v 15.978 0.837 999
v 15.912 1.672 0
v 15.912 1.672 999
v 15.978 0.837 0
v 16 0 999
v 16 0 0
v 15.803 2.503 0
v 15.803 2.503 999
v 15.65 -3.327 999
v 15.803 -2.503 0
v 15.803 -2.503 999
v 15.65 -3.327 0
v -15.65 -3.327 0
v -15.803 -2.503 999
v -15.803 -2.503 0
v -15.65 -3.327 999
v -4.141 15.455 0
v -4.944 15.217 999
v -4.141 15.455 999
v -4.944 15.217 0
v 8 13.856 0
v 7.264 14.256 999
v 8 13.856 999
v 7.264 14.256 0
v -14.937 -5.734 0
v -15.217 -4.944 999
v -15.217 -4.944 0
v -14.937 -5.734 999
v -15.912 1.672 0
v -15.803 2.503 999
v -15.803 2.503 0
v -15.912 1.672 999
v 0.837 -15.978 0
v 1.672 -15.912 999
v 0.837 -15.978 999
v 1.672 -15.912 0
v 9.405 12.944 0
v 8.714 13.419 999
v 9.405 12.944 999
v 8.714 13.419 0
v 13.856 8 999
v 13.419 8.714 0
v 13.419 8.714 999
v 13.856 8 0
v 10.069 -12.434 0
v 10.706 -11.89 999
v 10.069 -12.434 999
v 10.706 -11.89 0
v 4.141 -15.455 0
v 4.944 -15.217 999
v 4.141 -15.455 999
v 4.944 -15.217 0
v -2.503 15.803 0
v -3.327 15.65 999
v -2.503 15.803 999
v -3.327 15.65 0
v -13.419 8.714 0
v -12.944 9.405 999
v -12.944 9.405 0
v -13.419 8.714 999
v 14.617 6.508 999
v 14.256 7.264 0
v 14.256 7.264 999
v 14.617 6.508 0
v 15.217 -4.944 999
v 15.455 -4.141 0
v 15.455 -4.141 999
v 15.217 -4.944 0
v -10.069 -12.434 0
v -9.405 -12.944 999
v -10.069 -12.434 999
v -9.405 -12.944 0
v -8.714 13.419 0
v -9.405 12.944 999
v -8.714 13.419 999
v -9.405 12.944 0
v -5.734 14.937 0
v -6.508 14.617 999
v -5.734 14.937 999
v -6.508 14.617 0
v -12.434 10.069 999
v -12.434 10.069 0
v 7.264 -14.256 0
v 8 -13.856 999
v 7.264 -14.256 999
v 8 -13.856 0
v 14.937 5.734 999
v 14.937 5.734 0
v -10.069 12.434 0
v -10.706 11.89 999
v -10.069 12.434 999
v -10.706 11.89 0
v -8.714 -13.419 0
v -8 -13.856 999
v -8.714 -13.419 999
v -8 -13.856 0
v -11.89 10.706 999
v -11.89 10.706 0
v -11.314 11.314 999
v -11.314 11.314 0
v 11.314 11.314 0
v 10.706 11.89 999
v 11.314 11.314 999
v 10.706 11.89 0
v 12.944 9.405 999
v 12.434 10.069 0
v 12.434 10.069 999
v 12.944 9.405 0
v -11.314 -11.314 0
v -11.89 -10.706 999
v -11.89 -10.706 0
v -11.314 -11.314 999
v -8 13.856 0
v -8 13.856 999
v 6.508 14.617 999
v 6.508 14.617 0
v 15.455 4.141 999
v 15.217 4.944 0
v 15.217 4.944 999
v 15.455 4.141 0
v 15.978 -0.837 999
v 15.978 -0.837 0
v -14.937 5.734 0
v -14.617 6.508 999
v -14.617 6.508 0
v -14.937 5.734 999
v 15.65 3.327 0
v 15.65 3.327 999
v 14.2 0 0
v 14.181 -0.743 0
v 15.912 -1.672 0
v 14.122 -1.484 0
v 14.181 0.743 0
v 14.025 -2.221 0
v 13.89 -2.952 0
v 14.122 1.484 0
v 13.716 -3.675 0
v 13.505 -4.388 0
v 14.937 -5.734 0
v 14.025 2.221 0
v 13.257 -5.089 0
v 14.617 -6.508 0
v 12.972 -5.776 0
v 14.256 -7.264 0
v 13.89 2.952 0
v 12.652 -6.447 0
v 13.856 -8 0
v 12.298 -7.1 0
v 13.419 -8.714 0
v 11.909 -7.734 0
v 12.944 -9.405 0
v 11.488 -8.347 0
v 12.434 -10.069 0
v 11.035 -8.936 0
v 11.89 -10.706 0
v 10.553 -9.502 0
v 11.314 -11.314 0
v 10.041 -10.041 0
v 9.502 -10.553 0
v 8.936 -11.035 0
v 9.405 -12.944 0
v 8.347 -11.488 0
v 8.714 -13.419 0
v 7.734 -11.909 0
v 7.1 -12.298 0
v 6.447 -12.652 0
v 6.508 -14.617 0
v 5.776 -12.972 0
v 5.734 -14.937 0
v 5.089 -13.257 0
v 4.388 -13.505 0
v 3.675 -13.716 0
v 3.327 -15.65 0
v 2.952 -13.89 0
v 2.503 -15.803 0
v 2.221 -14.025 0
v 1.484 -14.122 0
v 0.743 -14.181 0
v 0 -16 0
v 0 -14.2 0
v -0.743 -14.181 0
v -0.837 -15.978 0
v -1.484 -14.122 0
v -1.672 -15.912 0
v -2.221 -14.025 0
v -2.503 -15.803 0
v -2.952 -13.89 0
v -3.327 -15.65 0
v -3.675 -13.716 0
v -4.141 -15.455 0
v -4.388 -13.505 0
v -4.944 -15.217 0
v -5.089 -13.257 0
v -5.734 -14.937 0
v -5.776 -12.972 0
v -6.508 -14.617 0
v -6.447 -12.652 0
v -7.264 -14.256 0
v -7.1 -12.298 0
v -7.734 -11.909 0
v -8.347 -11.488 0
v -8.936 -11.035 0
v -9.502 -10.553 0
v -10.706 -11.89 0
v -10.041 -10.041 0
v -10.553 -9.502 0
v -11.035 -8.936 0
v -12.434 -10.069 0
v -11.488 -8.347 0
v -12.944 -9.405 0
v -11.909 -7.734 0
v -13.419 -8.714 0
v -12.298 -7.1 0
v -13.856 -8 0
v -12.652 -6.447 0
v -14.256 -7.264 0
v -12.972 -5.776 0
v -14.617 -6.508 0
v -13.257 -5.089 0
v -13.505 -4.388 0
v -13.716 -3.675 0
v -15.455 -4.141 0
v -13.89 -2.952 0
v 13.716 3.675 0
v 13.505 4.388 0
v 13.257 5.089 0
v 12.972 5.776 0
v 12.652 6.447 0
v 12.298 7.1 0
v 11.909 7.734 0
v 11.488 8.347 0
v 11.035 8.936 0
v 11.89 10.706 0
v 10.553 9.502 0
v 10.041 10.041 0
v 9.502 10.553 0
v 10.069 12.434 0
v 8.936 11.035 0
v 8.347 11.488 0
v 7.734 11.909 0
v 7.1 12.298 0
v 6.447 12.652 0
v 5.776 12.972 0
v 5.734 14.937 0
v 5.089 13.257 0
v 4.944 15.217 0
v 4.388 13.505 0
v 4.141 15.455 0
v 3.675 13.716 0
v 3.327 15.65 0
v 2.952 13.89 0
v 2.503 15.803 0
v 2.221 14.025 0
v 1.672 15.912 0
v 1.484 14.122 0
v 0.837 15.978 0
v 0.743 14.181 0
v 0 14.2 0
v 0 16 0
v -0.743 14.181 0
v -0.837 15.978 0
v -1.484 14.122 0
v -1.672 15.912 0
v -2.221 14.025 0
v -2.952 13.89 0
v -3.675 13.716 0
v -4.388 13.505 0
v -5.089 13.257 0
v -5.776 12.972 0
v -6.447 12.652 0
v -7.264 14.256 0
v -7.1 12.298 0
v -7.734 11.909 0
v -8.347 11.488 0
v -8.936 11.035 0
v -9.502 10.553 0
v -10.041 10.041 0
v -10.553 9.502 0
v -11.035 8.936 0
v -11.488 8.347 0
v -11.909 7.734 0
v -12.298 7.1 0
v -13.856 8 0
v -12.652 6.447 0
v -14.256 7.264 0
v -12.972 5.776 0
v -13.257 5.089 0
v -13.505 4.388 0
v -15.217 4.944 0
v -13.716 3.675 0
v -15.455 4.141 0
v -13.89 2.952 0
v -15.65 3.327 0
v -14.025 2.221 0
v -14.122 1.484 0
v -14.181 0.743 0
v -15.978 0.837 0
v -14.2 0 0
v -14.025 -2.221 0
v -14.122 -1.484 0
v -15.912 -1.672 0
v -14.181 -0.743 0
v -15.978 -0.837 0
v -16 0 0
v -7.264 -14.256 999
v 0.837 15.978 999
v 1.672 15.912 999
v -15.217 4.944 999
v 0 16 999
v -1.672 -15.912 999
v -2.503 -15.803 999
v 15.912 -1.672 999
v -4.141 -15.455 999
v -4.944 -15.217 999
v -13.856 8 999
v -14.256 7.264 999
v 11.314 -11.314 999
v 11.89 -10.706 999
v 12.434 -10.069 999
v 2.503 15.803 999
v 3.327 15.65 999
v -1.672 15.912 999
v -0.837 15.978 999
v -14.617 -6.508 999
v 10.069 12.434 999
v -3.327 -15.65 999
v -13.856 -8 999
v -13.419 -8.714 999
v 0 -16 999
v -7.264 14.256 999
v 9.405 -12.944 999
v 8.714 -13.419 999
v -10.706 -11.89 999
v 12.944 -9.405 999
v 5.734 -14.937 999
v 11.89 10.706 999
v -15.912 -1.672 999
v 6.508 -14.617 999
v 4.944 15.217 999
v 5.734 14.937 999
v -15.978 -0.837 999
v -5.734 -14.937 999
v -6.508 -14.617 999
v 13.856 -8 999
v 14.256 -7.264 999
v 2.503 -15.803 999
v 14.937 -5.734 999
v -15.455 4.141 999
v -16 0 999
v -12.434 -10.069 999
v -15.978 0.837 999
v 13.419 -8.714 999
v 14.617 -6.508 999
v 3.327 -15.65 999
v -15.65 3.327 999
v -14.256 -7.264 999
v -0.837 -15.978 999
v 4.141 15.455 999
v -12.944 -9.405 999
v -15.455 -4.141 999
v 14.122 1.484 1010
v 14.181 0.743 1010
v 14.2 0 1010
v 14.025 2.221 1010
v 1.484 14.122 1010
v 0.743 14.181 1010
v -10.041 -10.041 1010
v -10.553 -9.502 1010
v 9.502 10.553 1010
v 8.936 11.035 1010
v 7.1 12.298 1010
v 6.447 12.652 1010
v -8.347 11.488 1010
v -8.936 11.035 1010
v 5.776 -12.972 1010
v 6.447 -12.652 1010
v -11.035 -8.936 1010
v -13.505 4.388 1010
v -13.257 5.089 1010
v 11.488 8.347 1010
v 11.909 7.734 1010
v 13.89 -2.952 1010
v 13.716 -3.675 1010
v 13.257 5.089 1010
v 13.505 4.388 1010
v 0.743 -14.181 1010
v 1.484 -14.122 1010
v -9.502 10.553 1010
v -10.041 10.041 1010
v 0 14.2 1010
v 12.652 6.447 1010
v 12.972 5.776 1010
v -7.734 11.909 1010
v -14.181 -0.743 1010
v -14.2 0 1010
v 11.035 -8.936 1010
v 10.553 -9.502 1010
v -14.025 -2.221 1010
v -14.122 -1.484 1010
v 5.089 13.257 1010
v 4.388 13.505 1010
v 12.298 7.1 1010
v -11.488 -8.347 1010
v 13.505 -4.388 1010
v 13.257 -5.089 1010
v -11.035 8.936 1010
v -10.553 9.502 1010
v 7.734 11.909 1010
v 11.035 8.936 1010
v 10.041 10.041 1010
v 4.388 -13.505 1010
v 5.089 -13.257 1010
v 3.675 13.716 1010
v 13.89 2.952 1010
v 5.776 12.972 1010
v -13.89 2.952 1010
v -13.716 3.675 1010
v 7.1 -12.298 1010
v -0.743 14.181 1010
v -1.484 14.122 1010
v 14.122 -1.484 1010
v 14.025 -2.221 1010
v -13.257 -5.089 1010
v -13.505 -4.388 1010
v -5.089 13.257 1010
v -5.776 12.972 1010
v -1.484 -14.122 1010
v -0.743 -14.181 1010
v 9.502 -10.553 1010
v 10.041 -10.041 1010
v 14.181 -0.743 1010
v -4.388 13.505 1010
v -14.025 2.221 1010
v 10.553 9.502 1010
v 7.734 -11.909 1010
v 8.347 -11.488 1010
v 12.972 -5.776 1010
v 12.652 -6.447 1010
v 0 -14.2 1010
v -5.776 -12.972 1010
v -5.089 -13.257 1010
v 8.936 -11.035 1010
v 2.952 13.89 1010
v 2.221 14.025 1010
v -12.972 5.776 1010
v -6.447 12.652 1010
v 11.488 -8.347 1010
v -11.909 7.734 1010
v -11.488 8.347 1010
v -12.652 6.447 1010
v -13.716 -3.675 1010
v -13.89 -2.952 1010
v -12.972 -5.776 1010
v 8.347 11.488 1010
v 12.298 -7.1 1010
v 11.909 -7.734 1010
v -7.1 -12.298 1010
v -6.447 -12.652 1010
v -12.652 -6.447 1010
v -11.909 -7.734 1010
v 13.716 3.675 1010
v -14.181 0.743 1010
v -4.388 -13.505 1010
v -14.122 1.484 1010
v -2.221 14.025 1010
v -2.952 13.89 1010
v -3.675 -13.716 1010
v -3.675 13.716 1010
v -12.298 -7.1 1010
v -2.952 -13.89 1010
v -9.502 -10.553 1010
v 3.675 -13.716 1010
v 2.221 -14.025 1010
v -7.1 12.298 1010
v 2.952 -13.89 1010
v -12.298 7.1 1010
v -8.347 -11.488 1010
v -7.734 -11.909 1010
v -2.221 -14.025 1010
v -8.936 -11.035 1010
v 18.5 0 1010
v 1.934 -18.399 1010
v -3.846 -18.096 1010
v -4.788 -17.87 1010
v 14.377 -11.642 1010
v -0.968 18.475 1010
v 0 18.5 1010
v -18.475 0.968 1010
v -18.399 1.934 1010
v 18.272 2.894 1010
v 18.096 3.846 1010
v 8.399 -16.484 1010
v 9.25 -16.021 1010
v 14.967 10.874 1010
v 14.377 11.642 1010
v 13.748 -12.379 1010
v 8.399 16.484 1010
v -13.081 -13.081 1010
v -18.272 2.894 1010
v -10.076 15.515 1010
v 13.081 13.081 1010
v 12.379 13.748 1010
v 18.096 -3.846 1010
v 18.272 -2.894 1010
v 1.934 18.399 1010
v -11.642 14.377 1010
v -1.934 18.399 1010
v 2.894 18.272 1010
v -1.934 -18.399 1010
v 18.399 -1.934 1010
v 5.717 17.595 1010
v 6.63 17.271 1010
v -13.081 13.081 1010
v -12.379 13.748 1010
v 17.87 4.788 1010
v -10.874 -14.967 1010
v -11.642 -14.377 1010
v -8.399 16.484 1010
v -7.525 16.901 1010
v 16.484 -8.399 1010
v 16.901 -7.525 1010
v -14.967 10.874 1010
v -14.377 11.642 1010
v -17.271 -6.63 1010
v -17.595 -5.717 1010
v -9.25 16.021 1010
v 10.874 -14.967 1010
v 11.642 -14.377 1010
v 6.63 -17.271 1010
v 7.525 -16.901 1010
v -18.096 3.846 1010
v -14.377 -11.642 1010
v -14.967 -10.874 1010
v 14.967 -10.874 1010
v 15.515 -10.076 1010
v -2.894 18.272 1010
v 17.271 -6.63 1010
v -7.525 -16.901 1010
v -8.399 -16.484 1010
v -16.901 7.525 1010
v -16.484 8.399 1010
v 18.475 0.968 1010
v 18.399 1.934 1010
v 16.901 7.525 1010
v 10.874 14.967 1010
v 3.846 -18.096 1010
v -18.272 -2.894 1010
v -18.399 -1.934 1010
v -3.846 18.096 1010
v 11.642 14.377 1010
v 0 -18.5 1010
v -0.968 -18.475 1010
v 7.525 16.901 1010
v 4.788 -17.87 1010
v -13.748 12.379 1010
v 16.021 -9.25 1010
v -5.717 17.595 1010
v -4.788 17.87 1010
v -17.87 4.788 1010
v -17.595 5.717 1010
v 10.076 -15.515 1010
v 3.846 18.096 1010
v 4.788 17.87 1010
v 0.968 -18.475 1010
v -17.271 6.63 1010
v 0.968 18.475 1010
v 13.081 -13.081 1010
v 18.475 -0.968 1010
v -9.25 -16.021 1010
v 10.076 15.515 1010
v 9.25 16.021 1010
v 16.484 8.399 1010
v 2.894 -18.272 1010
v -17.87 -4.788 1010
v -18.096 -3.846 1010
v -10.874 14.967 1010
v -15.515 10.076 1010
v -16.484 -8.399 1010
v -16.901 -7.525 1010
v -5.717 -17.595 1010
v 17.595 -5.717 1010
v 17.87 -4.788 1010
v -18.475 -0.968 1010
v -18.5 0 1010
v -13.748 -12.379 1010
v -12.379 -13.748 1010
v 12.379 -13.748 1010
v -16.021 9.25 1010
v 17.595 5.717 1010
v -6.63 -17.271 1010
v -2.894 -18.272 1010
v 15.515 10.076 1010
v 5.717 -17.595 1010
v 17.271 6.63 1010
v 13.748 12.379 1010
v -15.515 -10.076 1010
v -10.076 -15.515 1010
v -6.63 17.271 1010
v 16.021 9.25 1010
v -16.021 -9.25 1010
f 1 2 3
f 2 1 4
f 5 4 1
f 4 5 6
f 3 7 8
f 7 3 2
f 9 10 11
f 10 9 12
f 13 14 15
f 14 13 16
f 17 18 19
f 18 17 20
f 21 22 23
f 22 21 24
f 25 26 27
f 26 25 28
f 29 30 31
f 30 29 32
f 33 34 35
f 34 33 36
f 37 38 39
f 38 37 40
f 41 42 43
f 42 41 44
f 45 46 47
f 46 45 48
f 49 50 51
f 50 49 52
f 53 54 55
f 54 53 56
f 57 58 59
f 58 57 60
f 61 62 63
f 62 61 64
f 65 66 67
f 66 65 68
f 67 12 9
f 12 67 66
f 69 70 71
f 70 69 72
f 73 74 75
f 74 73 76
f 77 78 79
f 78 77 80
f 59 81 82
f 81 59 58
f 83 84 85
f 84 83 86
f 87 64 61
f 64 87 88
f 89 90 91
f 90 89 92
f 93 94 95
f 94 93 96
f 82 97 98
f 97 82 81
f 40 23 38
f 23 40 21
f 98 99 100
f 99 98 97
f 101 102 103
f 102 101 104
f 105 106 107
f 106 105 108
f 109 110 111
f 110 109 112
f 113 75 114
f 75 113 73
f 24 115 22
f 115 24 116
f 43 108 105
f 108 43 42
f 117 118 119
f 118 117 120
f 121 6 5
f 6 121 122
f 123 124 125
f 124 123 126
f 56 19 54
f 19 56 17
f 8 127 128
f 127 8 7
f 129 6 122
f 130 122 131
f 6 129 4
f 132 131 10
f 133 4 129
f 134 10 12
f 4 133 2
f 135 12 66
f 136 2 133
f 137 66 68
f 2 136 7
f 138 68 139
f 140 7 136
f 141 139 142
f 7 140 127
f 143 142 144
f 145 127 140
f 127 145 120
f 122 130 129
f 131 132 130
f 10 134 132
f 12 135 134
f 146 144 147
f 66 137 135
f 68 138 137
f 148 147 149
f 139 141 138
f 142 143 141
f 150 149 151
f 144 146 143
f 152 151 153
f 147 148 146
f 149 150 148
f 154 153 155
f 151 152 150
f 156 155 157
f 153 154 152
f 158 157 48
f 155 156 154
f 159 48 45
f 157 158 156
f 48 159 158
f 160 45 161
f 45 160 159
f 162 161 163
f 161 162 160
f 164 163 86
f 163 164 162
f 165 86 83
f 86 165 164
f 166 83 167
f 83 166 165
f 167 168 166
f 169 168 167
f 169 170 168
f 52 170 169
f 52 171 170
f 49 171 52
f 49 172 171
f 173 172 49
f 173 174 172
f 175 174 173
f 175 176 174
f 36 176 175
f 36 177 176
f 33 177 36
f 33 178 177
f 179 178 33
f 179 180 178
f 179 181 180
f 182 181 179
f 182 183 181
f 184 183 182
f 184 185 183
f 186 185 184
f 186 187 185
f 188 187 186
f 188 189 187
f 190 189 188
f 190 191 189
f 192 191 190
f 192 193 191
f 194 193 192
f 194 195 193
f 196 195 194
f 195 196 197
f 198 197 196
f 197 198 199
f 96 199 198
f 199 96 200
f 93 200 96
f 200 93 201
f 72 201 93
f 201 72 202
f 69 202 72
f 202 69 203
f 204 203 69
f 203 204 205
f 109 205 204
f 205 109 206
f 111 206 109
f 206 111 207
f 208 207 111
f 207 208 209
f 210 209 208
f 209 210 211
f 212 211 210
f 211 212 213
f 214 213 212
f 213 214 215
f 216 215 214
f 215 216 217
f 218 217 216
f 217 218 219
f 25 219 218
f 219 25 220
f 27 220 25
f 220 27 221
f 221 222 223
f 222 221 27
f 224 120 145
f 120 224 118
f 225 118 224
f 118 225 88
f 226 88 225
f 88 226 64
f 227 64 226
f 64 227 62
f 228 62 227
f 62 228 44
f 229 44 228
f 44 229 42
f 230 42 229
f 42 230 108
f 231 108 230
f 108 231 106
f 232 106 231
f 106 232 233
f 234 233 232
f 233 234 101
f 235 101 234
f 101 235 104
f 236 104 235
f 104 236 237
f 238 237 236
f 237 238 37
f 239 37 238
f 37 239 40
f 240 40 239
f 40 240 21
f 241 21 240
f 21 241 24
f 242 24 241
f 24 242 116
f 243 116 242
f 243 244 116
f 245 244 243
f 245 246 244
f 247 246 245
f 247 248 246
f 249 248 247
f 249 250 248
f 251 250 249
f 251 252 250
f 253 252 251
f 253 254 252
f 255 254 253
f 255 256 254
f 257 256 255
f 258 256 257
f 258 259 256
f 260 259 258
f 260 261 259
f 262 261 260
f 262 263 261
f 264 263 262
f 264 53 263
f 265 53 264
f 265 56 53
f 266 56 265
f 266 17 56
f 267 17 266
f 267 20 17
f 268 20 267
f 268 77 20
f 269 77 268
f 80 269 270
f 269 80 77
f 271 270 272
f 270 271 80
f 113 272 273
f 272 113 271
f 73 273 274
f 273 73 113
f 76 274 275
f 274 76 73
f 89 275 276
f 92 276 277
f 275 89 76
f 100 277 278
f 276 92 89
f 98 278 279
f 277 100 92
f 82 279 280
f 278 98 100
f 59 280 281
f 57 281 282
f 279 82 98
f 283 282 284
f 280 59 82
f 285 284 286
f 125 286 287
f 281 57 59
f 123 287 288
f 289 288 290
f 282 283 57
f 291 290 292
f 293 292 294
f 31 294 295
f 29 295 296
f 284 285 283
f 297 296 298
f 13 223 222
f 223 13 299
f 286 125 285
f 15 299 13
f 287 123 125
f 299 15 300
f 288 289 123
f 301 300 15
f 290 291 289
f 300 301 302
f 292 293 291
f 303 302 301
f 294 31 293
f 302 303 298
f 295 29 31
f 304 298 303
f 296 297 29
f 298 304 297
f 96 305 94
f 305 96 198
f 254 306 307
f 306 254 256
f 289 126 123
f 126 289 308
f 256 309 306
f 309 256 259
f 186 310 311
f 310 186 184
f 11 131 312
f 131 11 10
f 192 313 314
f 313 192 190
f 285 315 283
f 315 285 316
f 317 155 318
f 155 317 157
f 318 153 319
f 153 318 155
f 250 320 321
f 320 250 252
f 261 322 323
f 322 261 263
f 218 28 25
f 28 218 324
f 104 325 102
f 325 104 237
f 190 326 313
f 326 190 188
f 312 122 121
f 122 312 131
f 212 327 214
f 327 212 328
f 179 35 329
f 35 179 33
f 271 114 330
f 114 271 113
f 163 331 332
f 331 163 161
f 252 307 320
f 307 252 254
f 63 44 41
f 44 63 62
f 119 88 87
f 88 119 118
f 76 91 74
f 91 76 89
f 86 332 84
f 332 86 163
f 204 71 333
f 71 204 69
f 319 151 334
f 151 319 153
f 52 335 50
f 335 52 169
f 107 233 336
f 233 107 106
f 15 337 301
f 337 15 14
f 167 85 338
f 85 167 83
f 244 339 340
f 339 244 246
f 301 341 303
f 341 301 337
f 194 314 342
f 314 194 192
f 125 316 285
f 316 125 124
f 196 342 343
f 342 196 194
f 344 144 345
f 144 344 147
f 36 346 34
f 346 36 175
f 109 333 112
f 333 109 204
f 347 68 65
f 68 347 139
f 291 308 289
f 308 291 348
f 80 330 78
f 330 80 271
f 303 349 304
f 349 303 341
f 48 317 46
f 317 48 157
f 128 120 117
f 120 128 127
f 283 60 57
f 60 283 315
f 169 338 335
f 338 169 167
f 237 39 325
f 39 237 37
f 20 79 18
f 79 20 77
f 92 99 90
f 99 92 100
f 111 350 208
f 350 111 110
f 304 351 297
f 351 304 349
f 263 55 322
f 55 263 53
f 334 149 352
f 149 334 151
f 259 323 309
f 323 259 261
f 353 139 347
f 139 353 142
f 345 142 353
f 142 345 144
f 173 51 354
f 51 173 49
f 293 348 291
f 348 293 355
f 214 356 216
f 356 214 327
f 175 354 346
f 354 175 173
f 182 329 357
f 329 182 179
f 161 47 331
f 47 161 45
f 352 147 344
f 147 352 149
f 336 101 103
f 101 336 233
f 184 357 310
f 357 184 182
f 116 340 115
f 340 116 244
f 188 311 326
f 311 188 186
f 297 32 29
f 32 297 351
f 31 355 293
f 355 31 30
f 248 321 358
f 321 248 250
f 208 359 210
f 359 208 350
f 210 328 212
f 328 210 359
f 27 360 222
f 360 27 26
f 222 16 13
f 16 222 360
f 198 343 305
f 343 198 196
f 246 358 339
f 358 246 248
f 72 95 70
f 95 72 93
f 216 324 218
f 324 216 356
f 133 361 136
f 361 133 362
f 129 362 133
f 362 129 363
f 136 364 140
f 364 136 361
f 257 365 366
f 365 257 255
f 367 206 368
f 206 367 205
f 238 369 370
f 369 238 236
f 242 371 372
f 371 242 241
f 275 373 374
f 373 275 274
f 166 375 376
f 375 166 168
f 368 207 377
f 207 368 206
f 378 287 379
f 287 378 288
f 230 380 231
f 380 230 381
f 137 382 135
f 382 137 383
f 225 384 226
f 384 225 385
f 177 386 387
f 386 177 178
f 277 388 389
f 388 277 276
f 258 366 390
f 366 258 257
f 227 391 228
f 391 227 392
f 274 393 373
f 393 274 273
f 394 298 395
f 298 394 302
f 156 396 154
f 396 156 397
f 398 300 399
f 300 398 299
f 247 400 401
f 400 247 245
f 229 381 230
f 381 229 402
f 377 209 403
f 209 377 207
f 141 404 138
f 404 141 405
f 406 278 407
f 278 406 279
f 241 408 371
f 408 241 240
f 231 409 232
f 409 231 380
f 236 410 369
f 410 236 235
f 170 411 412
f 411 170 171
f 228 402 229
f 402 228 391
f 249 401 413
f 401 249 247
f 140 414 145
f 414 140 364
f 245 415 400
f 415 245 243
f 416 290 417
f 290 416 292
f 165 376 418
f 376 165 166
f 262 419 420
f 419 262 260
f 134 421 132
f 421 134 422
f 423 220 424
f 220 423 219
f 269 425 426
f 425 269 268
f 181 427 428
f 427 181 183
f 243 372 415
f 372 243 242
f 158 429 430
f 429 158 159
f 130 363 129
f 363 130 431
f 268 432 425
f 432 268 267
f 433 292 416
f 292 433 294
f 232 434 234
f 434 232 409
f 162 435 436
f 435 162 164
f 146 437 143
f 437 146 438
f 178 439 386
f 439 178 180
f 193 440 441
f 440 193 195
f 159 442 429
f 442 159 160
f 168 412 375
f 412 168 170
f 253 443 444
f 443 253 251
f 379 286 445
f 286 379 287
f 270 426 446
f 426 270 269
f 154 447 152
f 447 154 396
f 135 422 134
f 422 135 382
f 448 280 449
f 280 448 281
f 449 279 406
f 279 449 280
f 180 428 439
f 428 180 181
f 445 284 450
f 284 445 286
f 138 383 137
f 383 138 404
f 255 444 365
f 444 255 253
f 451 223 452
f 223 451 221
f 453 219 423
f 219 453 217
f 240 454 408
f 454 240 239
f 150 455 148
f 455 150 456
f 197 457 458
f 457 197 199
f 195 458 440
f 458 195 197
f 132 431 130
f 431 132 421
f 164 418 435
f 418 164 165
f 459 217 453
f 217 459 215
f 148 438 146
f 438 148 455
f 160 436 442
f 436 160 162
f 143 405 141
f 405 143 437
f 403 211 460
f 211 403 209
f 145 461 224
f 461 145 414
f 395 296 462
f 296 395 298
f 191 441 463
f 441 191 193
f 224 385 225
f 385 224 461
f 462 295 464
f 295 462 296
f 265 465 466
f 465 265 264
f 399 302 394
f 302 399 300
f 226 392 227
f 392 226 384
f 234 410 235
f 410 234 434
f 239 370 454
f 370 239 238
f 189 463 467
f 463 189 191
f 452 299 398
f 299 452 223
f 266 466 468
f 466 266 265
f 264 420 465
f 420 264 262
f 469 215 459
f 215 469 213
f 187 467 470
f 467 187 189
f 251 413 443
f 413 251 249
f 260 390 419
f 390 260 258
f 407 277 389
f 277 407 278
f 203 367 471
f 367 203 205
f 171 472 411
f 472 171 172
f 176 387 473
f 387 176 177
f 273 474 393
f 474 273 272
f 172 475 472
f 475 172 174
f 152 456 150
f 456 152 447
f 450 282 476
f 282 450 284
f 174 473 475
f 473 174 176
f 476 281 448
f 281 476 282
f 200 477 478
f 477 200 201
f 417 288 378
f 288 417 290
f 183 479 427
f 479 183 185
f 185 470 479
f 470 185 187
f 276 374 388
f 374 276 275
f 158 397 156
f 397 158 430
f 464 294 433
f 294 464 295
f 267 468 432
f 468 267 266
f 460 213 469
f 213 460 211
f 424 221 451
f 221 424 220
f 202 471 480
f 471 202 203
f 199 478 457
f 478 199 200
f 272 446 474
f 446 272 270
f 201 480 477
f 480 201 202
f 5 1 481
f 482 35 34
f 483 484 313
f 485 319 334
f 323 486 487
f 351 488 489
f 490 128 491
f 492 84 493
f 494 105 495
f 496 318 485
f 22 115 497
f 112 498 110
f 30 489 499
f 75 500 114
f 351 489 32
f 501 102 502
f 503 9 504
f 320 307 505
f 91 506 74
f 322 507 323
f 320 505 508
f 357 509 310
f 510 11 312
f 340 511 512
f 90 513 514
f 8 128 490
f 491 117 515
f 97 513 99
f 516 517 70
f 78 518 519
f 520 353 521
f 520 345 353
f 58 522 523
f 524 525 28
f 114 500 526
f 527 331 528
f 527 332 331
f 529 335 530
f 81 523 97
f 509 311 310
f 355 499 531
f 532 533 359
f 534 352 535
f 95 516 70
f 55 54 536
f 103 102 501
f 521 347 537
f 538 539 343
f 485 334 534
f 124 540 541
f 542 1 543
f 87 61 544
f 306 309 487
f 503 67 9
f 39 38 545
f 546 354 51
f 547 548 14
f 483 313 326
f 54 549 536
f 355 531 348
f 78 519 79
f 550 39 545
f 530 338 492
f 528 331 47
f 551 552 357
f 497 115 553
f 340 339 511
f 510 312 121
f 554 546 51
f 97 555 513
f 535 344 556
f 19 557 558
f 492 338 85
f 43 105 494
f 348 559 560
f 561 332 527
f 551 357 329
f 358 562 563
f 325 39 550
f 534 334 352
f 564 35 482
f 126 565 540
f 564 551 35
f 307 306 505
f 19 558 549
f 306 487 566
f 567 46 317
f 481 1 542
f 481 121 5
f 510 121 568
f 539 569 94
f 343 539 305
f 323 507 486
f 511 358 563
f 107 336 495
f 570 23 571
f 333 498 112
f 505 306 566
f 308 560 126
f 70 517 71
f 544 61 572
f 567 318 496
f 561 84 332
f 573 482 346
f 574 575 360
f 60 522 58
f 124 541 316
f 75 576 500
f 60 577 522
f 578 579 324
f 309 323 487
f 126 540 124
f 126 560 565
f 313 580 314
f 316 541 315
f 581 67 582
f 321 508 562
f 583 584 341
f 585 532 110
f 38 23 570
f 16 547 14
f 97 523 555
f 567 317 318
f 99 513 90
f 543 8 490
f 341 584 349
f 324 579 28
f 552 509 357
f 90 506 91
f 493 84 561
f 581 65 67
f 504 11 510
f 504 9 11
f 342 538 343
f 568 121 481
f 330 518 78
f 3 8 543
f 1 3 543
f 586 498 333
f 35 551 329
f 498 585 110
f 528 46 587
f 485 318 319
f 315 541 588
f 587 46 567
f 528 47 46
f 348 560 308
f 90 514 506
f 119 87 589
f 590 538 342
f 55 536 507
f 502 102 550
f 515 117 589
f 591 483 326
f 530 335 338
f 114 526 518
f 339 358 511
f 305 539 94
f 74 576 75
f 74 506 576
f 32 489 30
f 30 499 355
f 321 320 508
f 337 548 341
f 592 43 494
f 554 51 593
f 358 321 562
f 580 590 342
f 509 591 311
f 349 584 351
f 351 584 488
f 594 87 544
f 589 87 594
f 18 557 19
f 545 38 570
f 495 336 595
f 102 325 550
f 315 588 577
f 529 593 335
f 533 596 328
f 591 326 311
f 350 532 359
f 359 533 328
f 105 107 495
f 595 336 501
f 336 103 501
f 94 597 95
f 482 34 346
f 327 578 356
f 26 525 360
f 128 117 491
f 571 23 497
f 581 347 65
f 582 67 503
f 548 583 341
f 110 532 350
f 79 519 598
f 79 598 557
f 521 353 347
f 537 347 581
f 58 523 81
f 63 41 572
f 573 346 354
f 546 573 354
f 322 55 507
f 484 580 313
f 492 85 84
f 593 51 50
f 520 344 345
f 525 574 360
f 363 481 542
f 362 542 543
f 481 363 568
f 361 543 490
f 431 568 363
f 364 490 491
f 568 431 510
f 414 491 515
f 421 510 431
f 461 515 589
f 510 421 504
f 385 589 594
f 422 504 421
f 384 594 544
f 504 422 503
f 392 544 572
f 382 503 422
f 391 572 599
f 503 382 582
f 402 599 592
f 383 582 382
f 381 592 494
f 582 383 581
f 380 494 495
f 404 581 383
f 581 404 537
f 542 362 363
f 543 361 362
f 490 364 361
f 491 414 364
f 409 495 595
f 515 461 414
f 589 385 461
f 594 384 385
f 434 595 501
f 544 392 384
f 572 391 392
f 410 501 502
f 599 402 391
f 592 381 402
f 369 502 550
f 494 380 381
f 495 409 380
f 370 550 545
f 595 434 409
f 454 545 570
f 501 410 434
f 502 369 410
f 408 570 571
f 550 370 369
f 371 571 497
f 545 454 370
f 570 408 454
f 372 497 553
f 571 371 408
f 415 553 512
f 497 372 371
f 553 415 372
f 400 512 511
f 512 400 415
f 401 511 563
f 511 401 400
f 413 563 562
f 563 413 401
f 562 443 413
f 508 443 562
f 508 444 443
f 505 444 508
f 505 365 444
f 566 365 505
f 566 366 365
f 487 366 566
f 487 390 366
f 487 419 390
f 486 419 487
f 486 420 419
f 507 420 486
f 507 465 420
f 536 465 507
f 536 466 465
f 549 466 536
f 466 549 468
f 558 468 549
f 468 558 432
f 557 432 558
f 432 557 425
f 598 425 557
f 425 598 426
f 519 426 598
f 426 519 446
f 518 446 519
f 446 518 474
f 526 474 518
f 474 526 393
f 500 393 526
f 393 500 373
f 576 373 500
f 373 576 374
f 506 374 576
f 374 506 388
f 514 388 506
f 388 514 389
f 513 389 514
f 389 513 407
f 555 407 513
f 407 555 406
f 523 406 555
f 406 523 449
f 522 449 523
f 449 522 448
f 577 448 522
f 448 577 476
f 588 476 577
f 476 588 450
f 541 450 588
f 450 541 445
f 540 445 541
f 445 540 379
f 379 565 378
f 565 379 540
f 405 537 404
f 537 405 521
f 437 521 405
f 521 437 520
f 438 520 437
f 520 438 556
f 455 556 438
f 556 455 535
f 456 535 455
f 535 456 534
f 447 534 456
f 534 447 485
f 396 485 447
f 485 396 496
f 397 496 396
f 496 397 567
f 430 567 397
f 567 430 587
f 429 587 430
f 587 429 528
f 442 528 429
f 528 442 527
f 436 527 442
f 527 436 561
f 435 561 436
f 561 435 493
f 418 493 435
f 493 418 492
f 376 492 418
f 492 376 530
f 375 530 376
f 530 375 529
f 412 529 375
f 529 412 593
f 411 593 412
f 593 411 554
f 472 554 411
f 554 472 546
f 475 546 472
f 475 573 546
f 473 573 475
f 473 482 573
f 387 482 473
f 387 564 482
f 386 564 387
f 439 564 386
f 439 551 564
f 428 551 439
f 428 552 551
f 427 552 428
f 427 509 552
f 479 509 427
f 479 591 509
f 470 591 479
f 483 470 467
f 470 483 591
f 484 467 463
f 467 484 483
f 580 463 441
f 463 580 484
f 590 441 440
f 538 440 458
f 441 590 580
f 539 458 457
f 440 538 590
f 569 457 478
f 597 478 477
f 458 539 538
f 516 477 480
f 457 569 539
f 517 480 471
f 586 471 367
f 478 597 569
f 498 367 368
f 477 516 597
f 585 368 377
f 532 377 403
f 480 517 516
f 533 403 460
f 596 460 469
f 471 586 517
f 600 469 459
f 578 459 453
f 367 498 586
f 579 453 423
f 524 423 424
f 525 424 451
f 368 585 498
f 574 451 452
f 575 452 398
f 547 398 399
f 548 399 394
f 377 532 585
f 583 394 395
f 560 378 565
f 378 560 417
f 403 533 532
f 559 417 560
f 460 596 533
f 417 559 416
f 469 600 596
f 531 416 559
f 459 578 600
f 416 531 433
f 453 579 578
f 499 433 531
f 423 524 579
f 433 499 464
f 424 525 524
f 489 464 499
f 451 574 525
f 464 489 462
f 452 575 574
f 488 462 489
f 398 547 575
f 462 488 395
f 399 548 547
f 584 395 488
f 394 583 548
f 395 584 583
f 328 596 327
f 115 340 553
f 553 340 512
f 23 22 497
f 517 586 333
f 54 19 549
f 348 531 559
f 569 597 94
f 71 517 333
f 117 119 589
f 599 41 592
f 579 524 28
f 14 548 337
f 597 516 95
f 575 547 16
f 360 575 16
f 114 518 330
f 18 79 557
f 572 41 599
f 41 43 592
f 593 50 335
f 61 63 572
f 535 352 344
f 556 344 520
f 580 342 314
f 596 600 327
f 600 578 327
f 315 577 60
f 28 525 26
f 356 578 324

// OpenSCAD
// HT 32 pipe 1000 mm (hollow) with a connected end socket
$fn = 120;

// Dimensions (mm)
outer_diameter = 32;
wall_thickness = 1.8;
length = 1000;

// Simple socket/end fitting (kept modest, but connected)
socket_h = 10;
socket_extra_d = 5;   // socket OD increase over pipe OD
overlap = 1;          // ensures solid connection (no floating)

// Derived
inner_diameter = outer_diameter - 2 * wall_thickness;

module ht_pipe_body() {
    difference() {
        cylinder(h = length, d = outer_diameter);
        translate([0, 0, -0.5])
            cylinder(h = length + 1, d = inner_diameter);
    }
}

module end_socket() {
    // Place so it overlaps the pipe by 'overlap' to guarantee connectivity
    translate([0, 0, length - overlap])
        difference() {
            cylinder(h = socket_h + overlap, d1 = outer_diameter, d2 = outer_diameter + socket_extra_d);
            translate([0, 0, -0.5])
                cylinder(h = socket_h + overlap + 1, d = inner_diameter);
        }
}

union() {
    ht_pipe_body();
    end_socket();
}
